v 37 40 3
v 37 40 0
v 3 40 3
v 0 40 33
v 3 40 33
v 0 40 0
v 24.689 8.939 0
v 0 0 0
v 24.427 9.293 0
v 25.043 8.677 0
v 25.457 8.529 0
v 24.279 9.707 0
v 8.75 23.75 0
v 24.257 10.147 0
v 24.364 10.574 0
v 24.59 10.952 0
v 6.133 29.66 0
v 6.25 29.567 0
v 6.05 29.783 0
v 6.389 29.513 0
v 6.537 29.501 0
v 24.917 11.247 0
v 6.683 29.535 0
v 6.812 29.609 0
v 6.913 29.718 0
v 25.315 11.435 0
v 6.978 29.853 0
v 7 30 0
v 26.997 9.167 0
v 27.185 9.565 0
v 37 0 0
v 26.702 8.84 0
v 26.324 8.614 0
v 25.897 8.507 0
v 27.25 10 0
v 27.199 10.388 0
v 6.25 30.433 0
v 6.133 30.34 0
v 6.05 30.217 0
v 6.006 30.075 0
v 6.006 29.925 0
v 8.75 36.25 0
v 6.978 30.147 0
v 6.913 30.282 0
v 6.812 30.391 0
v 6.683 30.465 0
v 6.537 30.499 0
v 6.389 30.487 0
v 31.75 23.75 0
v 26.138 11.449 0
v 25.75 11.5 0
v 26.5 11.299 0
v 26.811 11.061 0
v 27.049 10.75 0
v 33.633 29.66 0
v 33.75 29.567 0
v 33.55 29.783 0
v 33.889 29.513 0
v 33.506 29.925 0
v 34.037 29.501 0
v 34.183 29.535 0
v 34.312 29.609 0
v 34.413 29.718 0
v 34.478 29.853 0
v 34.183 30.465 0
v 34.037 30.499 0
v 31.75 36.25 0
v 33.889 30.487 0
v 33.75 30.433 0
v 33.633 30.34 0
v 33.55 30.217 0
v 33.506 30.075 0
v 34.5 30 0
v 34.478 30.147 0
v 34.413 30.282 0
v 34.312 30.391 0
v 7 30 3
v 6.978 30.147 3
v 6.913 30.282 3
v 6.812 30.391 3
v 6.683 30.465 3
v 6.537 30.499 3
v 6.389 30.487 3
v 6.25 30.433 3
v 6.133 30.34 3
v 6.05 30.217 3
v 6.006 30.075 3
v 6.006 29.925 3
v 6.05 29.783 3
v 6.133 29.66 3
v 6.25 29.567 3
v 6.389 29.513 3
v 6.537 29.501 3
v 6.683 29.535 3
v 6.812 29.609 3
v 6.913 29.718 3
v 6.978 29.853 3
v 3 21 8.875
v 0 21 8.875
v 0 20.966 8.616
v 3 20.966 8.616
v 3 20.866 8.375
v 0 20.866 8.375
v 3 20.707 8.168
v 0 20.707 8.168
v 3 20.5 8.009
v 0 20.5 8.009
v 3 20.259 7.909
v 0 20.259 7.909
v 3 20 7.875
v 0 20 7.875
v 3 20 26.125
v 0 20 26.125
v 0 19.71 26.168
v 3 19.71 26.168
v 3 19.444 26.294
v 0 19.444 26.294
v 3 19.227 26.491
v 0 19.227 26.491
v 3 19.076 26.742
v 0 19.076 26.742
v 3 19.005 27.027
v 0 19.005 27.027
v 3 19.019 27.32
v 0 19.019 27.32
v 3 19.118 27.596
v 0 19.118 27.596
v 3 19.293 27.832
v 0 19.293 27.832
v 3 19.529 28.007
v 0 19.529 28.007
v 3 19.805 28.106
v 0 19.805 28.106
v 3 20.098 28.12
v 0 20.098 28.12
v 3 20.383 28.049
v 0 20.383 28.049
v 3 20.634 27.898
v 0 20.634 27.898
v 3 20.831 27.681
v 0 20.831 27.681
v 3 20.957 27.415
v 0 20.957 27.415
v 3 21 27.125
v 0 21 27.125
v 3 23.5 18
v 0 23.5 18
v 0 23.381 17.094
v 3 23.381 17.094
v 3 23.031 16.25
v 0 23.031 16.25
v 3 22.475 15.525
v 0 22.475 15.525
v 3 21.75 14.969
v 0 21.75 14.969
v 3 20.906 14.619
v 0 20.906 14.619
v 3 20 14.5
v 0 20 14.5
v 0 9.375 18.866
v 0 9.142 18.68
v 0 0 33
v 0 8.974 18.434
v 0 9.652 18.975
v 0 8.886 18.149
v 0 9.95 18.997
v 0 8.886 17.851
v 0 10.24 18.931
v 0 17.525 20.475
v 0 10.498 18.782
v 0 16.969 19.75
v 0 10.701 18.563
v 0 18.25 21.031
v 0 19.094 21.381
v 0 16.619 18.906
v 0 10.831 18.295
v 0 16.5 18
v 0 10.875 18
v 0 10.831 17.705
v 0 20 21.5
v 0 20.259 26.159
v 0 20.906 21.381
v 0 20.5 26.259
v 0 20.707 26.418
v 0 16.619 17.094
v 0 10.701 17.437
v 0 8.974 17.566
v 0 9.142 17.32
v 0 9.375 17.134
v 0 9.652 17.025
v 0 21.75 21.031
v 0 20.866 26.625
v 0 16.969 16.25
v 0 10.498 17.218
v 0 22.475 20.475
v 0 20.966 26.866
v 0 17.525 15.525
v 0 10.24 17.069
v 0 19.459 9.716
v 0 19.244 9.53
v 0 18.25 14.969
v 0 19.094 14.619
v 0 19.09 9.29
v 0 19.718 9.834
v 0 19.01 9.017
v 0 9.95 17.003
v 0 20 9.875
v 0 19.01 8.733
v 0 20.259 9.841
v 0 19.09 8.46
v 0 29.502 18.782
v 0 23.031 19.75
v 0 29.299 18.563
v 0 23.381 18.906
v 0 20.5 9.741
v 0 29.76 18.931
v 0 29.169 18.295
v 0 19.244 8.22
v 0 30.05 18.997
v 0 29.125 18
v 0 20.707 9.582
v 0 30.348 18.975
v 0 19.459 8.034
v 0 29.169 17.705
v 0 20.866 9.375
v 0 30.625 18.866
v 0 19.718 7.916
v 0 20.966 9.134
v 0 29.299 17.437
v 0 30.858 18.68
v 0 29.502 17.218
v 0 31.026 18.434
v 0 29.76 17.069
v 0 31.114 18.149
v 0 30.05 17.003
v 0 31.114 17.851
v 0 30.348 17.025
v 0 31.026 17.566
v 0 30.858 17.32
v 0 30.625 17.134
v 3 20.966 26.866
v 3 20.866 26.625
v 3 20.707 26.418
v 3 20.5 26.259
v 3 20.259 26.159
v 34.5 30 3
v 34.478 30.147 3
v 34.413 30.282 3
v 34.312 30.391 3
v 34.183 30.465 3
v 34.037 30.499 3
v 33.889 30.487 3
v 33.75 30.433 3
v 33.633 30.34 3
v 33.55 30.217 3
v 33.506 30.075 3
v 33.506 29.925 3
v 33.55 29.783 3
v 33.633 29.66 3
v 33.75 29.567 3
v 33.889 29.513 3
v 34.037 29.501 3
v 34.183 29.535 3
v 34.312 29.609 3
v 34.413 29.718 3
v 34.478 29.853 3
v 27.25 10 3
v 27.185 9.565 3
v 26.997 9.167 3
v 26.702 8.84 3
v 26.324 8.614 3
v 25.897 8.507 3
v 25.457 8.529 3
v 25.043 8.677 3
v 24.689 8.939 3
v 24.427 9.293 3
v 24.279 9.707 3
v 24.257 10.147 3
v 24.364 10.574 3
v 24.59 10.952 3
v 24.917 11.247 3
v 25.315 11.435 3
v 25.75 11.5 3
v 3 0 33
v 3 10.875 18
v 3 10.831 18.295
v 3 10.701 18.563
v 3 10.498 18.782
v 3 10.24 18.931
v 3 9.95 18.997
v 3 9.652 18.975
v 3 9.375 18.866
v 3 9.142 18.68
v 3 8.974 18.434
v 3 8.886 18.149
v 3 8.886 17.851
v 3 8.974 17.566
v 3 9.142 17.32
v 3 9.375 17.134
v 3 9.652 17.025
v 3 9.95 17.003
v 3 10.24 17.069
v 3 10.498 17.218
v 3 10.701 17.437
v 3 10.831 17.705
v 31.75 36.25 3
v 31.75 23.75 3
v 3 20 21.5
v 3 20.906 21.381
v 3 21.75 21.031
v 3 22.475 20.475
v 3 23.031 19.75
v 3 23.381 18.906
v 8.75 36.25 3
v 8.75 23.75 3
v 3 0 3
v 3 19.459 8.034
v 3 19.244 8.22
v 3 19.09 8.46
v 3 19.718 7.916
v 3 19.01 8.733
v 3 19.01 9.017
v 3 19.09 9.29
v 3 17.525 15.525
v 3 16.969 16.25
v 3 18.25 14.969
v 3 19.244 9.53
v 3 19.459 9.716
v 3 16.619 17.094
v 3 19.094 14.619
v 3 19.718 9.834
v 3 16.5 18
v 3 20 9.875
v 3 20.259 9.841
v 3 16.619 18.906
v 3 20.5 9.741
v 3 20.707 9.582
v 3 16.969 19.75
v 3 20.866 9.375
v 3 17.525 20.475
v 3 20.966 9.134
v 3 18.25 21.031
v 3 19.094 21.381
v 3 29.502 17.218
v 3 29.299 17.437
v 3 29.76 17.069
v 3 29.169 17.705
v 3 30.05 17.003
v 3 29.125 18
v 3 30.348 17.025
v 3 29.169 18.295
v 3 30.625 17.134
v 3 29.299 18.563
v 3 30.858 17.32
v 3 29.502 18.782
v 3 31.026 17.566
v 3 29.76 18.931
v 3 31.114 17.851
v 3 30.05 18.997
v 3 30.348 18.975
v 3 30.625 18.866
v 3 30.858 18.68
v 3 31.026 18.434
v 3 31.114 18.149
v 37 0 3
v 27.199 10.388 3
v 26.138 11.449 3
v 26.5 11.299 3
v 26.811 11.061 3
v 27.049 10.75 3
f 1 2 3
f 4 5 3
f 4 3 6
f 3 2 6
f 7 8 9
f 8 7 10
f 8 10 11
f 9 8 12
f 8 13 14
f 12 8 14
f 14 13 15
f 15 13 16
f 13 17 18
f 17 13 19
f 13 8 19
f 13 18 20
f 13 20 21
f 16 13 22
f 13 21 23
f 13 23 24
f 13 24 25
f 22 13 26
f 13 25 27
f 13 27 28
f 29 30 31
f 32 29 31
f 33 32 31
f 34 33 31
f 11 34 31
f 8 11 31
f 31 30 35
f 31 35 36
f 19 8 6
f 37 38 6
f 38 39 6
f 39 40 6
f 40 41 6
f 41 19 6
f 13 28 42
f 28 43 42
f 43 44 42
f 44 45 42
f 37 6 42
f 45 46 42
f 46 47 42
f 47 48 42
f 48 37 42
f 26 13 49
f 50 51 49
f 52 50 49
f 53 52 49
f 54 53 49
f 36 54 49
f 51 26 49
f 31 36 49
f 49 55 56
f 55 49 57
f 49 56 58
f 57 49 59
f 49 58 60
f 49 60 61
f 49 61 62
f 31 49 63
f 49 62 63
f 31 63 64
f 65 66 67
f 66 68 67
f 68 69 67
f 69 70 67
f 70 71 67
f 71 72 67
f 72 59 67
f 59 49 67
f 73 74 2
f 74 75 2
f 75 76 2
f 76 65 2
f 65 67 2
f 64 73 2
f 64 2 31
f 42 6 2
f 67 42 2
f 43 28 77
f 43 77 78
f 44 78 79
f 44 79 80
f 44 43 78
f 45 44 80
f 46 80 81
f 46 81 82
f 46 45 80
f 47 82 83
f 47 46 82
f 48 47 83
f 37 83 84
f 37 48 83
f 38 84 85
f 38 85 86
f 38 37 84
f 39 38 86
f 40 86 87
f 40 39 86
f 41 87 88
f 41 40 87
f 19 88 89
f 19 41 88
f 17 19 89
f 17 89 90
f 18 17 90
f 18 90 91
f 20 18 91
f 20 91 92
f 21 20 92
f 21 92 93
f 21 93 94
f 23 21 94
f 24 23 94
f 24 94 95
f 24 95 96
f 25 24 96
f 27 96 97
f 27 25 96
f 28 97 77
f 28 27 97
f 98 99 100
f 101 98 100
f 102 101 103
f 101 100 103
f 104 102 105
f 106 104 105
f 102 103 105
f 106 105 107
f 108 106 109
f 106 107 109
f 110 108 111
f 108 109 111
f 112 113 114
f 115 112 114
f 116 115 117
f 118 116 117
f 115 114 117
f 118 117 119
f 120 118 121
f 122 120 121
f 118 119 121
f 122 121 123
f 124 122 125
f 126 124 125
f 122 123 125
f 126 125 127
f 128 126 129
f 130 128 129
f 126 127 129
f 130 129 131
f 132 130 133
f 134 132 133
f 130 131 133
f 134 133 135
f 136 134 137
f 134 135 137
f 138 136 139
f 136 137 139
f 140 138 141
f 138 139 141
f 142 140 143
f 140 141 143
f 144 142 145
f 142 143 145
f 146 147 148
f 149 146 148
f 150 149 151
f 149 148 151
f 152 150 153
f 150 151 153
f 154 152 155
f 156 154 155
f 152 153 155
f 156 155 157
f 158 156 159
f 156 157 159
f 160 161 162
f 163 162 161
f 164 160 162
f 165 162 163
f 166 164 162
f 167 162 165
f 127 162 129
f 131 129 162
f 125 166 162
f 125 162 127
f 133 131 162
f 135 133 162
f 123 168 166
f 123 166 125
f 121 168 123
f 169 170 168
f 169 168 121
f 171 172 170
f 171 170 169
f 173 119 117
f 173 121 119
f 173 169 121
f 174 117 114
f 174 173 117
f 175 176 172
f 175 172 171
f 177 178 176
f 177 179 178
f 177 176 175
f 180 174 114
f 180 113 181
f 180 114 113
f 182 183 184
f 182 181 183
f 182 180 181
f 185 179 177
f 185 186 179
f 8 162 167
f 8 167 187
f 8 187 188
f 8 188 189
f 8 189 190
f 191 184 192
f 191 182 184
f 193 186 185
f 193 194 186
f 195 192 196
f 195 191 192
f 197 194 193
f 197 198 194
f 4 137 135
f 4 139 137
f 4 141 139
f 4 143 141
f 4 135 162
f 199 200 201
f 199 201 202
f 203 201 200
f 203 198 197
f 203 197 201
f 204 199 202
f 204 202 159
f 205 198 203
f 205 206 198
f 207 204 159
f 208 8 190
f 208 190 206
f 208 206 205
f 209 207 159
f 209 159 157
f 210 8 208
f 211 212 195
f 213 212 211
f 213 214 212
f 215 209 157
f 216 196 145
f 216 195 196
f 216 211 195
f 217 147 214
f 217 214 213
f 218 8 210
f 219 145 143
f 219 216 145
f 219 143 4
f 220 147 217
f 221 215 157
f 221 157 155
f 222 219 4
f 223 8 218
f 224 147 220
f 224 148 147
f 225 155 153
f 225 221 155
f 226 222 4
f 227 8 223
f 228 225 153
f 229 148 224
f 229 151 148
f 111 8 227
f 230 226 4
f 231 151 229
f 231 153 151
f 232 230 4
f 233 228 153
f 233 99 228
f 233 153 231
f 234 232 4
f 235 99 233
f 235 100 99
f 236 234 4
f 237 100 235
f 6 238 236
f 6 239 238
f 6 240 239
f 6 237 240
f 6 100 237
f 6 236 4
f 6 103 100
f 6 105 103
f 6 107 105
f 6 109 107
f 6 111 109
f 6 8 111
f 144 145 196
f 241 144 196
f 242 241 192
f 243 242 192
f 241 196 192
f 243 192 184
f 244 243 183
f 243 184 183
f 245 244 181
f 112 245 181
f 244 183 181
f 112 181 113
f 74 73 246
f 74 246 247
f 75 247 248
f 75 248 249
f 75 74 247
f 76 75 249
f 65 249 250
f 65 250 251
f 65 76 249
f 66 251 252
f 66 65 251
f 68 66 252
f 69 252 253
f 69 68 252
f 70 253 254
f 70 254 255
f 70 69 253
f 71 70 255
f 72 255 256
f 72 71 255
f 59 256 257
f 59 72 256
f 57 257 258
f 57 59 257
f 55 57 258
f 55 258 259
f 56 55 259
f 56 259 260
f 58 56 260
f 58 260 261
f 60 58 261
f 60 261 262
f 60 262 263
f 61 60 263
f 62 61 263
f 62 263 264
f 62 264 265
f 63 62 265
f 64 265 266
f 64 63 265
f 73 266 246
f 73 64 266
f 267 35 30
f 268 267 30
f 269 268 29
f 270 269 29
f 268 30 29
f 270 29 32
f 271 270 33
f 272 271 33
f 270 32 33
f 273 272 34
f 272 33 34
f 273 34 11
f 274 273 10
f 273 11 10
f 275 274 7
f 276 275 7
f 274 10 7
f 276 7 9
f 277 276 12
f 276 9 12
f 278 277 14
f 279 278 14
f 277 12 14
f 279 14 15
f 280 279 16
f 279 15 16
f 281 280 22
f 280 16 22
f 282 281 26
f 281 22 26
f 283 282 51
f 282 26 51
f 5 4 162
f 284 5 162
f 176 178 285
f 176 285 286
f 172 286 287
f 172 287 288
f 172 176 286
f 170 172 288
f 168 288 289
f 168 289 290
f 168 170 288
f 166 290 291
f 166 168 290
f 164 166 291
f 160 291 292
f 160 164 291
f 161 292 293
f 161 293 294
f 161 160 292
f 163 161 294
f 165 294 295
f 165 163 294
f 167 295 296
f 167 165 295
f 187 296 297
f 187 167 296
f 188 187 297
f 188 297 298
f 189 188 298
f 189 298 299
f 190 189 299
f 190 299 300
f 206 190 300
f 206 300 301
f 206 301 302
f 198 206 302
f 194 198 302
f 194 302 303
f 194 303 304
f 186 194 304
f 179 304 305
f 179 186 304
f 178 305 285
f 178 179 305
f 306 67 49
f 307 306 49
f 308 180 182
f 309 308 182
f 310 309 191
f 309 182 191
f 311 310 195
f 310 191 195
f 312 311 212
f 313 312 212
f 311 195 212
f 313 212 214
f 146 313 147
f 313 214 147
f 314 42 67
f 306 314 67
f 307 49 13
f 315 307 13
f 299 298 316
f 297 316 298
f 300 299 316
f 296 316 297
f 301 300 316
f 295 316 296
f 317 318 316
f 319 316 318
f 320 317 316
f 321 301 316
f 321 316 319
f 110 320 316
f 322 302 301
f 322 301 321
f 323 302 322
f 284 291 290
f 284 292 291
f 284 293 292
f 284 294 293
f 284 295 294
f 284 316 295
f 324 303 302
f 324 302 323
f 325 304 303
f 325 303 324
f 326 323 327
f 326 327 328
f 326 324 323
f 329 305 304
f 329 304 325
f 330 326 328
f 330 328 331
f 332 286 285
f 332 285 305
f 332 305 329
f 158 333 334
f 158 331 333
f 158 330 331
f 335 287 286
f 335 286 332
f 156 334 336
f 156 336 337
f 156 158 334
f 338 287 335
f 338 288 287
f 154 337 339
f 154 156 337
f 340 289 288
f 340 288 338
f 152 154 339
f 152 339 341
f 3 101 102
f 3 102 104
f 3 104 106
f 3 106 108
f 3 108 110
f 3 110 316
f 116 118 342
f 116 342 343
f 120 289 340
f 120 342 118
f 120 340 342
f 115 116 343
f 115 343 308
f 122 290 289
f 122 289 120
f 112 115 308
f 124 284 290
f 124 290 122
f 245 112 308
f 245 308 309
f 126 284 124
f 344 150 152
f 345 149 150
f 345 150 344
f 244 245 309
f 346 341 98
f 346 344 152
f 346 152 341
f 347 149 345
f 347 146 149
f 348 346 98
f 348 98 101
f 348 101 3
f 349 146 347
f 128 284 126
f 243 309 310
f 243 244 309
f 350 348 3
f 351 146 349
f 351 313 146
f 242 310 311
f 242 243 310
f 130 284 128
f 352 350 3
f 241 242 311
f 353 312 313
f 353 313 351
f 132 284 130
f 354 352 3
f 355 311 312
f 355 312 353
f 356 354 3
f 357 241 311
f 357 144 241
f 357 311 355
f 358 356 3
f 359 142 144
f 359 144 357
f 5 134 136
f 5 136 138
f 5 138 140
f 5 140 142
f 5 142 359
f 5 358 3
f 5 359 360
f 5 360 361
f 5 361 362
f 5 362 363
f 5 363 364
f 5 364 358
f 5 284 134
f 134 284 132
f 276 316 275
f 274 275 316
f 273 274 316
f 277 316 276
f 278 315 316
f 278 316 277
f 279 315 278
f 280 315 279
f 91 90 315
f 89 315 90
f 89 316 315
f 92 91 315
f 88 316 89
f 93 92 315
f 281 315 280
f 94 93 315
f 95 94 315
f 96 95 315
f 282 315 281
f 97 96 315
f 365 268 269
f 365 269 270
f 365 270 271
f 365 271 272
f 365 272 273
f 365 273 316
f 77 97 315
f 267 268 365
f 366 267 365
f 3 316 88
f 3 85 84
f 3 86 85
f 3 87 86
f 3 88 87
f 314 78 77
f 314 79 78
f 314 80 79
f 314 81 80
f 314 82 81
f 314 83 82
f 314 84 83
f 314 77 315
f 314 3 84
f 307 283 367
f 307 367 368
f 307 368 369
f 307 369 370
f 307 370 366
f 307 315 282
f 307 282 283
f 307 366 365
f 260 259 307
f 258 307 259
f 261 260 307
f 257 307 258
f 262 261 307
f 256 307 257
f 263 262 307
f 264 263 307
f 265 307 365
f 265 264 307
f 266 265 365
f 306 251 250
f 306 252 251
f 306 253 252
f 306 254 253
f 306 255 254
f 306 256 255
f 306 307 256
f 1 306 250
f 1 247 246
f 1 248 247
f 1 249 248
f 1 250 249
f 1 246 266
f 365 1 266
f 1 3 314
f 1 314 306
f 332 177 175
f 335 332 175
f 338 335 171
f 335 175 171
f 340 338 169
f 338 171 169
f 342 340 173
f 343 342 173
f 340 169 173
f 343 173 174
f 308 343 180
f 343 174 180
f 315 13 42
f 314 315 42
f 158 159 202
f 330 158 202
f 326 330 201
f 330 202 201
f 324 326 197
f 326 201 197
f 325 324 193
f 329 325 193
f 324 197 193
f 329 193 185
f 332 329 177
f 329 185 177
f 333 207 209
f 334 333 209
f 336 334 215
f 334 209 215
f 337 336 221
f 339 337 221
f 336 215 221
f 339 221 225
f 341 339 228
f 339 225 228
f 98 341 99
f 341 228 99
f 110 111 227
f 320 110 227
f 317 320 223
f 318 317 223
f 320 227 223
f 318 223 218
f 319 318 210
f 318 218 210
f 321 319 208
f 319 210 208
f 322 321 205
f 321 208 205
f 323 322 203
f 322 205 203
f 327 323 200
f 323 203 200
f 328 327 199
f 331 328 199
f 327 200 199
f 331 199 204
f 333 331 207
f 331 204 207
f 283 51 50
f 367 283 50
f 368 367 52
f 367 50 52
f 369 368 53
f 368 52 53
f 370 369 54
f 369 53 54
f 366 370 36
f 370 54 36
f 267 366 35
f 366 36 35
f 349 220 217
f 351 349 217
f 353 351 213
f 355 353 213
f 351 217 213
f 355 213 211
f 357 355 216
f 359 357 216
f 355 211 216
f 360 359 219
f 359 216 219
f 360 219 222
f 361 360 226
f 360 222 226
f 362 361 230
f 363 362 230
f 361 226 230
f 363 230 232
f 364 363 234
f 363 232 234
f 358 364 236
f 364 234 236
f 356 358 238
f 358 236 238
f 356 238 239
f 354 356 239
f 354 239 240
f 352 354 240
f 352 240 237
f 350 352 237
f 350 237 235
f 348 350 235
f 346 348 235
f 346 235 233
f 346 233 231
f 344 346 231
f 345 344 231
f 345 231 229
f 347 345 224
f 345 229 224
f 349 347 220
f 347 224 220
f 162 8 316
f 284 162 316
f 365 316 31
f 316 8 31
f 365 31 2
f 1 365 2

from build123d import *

# Parameters (mm, degrees)
F0_W     = 34
F0_H     = 40
F0_R     = 0.5
F0_W_2   = 3
F1_DEPTH = 3
F2_R     = 1
F3_DEPTH = 3


with BuildPart() as f1:
    # F0 (on Top) → F1 (new body)
    with BuildSketch(Plane.XY):
        with Locations((20, 20)):
            Rectangle(F0_W, F0_H)
        with BuildLine():
            ThreePointArc((27.25, 10), (24.68934, 8.93934), (25.75, 11.5))
            ThreePointArc((25.75, 11.5), (26.81066, 11.06066), (27.25, 10))
        make_face(mode=Mode.SUBTRACT)
        with Locations((6.5, 30)):
            Circle(F0_R, mode=Mode.SUBTRACT)
        Polygon((8.75, 23.75), (8.75, 36.25), (31.75, 36.25), (31.75, 23.75), (25.75, 23.75), (14.75, 23.75), align=None, mode=Mode.SUBTRACT)
        with Locations((34, 30)):
            Circle(F0_R, mode=Mode.SUBTRACT)
        with Locations((1.5, 20)):
            Rectangle(F0_W_2, F0_H)
    extrude(amount=F1_DEPTH)

    # F2 (on Right) → F3 (join)
    with BuildSketch(Plane.YZ):
        Polygon((0, 3), (0, 0), (20, 0), (40, 0), (40, 30), (40, 33), (34, 33), (0, 33), align=None)
        with BuildLine():
            ThreePointArc((21, 8.875), (20.707107, 8.167893), (20, 7.875))
            ThreePointArc((20, 7.875), (19, 8.875), (20, 9.875))
            ThreePointArc((20, 9.875), (20.707107, 9.582107), (21, 8.875))
        make_face(mode=Mode.SUBTRACT)
        with Locations((9.875, 18)):
            Circle(F2_R, mode=Mode.SUBTRACT)
        with BuildLine():
            ThreePointArc((23.5, 18), (22.474874, 15.525126), (20, 14.5))
            ThreePointArc((20, 14.5), (17.525126, 15.525126), (16.5, 18))
            ThreePointArc((16.5, 18), (17.525126, 20.474874), (20, 21.5))
            ThreePointArc((20, 21.5), (22.474874, 20.474874), (23.5, 18))
        make_face(mode=Mode.SUBTRACT)
        with BuildLine():
            ThreePointArc((31.125, 18), (30.125, 17), (29.125, 18))
            ThreePointArc((29.125, 18), (30.125, 19), (31.125, 18))
        make_face(mode=Mode.SUBTRACT)
        with BuildLine():
            ThreePointArc((21, 27.125), (20.707107, 26.417893), (20, 26.125))
            ThreePointArc((20, 26.125), (19.292893, 27.832107), (21, 27.125))
        make_face(mode=Mode.SUBTRACT)
    extrude(amount=F3_DEPTH)


solid = f1.part
